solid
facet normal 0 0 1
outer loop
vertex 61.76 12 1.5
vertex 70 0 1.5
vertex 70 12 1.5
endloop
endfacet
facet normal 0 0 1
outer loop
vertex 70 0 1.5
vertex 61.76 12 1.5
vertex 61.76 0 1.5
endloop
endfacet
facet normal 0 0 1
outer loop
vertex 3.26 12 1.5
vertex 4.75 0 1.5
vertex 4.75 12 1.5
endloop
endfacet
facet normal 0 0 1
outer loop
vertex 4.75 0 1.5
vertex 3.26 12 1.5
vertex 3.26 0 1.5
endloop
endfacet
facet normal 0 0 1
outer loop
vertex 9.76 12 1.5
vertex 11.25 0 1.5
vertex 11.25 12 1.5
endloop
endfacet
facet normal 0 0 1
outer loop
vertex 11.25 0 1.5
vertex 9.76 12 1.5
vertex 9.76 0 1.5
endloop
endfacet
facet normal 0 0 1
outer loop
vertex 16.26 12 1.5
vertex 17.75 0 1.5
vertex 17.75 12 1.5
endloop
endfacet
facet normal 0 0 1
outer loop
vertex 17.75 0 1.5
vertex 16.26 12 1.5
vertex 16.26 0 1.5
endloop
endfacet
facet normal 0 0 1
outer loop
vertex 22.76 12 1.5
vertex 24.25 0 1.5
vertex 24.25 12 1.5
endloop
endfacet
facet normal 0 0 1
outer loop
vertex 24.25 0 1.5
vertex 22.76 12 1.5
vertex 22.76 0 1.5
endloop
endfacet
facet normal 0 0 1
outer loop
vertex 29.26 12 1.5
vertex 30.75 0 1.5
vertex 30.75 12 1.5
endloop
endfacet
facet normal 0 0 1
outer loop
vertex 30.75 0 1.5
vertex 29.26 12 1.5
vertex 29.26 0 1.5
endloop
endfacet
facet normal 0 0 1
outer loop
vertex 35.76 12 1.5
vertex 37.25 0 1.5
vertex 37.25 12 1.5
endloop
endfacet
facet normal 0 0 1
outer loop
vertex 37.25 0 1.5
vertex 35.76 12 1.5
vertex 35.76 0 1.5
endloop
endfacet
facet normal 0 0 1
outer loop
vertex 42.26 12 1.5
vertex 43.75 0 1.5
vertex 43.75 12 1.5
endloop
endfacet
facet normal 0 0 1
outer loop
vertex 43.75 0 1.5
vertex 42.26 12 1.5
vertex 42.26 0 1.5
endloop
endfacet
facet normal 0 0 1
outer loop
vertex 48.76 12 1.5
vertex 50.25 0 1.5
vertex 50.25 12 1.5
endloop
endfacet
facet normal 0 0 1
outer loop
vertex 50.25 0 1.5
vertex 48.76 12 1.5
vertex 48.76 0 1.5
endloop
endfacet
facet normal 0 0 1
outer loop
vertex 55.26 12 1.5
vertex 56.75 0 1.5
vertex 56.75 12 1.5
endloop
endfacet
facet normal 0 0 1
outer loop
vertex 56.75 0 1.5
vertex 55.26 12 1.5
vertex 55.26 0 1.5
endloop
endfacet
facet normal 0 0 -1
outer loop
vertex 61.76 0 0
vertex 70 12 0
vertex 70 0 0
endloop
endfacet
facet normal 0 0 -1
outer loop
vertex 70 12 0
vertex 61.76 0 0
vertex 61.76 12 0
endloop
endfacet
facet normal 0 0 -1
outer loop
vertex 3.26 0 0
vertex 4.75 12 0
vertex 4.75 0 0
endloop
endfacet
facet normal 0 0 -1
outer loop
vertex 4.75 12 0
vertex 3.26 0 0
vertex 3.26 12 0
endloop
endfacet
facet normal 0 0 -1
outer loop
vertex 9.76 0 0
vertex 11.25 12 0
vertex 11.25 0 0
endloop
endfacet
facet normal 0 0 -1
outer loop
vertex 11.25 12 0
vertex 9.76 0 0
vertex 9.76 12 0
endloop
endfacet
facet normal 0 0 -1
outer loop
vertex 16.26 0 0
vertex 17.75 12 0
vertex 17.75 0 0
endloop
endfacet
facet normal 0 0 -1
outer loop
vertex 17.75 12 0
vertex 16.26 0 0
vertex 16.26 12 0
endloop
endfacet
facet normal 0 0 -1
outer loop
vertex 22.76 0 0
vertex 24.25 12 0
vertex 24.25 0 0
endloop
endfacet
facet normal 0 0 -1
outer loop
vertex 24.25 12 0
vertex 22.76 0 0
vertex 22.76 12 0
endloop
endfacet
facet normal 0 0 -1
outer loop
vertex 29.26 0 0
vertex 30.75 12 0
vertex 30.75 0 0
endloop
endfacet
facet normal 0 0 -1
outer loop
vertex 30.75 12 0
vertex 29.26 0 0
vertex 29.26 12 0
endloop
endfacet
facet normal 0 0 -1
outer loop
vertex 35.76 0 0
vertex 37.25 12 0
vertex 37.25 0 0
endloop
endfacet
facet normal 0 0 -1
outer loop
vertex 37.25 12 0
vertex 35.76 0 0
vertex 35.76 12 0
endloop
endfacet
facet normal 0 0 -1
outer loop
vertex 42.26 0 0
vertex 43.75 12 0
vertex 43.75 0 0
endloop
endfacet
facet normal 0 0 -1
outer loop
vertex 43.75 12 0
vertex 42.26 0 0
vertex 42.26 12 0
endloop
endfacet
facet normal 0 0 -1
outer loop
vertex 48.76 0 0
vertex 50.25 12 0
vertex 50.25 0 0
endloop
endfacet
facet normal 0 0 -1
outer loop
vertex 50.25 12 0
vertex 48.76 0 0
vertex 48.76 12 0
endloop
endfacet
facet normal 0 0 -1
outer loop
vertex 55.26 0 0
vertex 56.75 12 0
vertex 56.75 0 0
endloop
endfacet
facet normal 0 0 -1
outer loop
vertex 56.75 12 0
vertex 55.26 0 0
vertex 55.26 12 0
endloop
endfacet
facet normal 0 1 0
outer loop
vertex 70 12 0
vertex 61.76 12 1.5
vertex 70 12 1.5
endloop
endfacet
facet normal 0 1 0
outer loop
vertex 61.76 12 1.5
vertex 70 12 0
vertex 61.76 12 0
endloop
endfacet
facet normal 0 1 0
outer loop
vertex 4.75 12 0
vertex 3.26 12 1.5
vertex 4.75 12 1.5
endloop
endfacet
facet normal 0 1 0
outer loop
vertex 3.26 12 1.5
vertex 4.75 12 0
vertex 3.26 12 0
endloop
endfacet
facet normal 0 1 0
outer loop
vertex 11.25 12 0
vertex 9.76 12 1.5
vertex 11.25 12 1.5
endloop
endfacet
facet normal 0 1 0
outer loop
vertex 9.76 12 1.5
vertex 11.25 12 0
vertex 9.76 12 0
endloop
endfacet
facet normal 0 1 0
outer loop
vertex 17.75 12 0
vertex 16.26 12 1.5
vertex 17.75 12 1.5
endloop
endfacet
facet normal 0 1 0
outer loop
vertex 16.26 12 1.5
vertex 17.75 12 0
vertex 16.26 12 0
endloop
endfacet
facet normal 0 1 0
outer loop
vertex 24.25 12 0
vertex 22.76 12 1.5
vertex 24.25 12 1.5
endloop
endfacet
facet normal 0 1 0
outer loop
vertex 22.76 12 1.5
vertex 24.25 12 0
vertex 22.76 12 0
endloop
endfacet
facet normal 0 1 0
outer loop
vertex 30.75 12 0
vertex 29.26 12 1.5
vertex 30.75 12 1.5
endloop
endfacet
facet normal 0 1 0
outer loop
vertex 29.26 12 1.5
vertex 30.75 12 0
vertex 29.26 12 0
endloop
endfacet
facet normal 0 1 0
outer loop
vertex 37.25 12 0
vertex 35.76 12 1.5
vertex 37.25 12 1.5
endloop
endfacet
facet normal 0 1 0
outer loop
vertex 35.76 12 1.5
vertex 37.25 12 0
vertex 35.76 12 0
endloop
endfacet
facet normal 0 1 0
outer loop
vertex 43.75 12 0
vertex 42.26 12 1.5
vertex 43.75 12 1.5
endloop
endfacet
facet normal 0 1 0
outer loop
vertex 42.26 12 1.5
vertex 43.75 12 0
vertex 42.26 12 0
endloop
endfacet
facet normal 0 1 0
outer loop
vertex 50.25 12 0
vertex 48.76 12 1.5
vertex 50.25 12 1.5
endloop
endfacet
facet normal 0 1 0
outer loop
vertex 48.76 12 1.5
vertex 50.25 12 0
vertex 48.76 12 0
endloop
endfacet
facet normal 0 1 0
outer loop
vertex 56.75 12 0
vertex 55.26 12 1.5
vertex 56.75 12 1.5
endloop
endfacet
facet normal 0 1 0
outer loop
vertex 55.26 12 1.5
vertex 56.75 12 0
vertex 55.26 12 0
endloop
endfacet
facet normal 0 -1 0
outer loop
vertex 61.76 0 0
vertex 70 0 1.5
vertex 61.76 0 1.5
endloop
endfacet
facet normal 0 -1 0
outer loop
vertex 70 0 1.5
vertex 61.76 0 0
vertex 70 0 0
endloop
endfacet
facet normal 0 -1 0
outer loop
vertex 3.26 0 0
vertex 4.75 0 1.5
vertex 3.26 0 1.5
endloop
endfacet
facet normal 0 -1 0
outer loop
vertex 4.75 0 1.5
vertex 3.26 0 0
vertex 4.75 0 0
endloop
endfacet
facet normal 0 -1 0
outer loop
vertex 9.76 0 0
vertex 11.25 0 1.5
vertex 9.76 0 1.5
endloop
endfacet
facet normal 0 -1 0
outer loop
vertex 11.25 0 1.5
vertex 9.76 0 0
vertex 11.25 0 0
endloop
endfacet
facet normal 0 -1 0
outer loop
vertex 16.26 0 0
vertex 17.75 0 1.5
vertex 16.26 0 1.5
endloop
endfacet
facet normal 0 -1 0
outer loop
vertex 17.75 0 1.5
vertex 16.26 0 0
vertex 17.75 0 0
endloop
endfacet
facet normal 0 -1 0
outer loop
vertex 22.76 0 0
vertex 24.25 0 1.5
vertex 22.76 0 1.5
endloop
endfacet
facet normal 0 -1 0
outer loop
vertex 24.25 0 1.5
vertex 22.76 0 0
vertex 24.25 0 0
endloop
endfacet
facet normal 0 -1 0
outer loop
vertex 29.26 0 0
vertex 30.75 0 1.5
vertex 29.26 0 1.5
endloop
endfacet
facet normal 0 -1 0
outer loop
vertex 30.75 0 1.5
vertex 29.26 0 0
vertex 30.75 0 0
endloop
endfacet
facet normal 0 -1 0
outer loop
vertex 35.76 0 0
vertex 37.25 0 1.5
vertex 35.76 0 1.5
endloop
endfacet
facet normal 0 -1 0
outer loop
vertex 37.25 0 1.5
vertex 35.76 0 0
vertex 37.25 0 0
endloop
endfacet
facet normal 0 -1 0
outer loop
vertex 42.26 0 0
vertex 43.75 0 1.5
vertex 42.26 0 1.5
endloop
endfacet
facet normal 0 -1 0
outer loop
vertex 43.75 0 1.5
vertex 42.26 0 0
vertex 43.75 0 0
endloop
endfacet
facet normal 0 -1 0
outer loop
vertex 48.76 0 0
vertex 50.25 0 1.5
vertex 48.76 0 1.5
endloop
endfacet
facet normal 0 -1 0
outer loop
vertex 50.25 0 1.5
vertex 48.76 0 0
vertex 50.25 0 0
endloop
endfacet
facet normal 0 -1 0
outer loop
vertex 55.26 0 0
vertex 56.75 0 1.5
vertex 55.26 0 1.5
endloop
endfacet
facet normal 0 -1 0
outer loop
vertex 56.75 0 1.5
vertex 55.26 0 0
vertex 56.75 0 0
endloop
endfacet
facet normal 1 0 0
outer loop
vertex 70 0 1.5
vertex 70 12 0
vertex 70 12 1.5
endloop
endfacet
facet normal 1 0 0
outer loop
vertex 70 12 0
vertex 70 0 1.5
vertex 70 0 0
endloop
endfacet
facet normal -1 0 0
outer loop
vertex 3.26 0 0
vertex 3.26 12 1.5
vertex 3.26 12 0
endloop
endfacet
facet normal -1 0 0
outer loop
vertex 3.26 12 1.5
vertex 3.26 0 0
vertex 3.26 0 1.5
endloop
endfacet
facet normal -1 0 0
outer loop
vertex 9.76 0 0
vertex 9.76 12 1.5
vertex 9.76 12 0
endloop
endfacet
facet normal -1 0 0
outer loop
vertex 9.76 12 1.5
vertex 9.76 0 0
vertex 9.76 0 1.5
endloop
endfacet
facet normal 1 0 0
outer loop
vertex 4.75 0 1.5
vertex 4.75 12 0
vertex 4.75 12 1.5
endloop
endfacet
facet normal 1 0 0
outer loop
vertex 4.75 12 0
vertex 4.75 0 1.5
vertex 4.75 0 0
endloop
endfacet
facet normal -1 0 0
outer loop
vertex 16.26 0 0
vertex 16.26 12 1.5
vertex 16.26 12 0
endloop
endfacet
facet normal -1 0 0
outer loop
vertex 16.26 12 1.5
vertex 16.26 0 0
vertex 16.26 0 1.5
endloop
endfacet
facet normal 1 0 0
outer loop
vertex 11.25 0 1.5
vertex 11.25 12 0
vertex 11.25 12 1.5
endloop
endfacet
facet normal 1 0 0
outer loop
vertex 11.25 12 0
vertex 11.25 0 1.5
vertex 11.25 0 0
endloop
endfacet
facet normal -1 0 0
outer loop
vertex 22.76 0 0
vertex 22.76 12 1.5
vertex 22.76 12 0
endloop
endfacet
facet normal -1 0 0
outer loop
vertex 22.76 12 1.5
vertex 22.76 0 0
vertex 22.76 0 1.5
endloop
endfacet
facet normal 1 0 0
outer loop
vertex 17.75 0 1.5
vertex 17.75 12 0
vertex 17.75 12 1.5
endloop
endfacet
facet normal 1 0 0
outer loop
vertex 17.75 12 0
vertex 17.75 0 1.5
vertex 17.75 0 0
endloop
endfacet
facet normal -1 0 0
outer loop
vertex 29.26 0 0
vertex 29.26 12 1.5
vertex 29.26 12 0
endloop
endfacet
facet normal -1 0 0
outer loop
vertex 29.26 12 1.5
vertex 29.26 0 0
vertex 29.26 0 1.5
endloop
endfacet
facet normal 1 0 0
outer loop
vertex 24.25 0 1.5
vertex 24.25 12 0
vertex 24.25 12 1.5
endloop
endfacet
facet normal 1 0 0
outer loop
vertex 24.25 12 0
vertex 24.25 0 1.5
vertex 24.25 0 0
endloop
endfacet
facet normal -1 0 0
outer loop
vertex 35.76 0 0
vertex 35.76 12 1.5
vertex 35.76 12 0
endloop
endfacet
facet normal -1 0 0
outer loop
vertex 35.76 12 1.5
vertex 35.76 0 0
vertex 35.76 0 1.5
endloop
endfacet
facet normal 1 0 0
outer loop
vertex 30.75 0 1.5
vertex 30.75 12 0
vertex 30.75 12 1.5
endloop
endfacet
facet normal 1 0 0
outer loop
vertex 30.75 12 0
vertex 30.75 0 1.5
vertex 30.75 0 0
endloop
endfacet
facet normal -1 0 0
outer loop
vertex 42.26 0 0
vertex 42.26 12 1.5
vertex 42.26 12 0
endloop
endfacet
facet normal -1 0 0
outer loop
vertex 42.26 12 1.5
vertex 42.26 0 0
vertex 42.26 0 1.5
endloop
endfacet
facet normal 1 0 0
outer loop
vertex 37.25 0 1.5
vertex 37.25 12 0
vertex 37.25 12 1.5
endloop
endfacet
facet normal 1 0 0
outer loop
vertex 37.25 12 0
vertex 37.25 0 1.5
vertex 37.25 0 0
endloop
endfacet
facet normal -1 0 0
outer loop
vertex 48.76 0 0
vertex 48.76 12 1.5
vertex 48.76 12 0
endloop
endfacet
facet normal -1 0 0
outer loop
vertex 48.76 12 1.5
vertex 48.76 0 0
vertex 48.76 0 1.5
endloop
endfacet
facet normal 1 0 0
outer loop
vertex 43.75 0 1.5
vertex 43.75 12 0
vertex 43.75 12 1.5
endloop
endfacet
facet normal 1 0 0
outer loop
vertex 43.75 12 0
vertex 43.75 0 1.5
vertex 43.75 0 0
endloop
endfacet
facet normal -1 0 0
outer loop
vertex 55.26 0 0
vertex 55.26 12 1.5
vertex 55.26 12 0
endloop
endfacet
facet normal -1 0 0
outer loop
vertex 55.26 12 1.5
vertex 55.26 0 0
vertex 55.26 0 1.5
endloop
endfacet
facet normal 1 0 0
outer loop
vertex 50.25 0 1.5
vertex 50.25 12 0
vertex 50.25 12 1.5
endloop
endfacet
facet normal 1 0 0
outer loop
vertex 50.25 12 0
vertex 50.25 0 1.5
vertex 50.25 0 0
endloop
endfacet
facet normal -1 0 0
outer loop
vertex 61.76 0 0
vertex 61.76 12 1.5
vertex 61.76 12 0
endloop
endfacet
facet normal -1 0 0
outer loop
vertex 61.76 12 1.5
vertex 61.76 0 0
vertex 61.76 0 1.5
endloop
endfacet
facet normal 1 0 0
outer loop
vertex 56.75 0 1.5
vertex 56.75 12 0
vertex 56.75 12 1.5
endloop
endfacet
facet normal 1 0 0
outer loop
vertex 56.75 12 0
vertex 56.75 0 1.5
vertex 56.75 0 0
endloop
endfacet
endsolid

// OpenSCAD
// Agarose gel comb - a flat plate with a back bar and a row of rectangular teeth, for casting
// horizontal gels. NOVEL general part.
//

cols   = 10;
teeth_d = 5.0;
teeth_l = 12;
pitch  = 1.5;
bar_w   = 12;
t       = 1.5;

$fn = 48;

p2  = teeth_d + pitch;                 // centre-to-centre pitch
over = min(t / 2, pitch / 2);          // butt the teeth into the bar so no gap at the joint
L   = 70;                              // spine length (X)

difference() {
    union() {
        cube([L, bar_w, t]);                 // spine (back bar)
        for (i = [0 : cols - 1])
            translate([-(teeth_d / 2 - over) + i * p2, 0, 0]) cube([teeth_d, teeth_l, t]);   // teeth
    }
    for (i = [0 : cols - 1])
        translate([-(teeth_d / 2 - over) + i * p2, 0, -1]) cube([teeth_d + 0.01, teeth_l, t + 2]);   // pocket (open top) in each tooth
}
